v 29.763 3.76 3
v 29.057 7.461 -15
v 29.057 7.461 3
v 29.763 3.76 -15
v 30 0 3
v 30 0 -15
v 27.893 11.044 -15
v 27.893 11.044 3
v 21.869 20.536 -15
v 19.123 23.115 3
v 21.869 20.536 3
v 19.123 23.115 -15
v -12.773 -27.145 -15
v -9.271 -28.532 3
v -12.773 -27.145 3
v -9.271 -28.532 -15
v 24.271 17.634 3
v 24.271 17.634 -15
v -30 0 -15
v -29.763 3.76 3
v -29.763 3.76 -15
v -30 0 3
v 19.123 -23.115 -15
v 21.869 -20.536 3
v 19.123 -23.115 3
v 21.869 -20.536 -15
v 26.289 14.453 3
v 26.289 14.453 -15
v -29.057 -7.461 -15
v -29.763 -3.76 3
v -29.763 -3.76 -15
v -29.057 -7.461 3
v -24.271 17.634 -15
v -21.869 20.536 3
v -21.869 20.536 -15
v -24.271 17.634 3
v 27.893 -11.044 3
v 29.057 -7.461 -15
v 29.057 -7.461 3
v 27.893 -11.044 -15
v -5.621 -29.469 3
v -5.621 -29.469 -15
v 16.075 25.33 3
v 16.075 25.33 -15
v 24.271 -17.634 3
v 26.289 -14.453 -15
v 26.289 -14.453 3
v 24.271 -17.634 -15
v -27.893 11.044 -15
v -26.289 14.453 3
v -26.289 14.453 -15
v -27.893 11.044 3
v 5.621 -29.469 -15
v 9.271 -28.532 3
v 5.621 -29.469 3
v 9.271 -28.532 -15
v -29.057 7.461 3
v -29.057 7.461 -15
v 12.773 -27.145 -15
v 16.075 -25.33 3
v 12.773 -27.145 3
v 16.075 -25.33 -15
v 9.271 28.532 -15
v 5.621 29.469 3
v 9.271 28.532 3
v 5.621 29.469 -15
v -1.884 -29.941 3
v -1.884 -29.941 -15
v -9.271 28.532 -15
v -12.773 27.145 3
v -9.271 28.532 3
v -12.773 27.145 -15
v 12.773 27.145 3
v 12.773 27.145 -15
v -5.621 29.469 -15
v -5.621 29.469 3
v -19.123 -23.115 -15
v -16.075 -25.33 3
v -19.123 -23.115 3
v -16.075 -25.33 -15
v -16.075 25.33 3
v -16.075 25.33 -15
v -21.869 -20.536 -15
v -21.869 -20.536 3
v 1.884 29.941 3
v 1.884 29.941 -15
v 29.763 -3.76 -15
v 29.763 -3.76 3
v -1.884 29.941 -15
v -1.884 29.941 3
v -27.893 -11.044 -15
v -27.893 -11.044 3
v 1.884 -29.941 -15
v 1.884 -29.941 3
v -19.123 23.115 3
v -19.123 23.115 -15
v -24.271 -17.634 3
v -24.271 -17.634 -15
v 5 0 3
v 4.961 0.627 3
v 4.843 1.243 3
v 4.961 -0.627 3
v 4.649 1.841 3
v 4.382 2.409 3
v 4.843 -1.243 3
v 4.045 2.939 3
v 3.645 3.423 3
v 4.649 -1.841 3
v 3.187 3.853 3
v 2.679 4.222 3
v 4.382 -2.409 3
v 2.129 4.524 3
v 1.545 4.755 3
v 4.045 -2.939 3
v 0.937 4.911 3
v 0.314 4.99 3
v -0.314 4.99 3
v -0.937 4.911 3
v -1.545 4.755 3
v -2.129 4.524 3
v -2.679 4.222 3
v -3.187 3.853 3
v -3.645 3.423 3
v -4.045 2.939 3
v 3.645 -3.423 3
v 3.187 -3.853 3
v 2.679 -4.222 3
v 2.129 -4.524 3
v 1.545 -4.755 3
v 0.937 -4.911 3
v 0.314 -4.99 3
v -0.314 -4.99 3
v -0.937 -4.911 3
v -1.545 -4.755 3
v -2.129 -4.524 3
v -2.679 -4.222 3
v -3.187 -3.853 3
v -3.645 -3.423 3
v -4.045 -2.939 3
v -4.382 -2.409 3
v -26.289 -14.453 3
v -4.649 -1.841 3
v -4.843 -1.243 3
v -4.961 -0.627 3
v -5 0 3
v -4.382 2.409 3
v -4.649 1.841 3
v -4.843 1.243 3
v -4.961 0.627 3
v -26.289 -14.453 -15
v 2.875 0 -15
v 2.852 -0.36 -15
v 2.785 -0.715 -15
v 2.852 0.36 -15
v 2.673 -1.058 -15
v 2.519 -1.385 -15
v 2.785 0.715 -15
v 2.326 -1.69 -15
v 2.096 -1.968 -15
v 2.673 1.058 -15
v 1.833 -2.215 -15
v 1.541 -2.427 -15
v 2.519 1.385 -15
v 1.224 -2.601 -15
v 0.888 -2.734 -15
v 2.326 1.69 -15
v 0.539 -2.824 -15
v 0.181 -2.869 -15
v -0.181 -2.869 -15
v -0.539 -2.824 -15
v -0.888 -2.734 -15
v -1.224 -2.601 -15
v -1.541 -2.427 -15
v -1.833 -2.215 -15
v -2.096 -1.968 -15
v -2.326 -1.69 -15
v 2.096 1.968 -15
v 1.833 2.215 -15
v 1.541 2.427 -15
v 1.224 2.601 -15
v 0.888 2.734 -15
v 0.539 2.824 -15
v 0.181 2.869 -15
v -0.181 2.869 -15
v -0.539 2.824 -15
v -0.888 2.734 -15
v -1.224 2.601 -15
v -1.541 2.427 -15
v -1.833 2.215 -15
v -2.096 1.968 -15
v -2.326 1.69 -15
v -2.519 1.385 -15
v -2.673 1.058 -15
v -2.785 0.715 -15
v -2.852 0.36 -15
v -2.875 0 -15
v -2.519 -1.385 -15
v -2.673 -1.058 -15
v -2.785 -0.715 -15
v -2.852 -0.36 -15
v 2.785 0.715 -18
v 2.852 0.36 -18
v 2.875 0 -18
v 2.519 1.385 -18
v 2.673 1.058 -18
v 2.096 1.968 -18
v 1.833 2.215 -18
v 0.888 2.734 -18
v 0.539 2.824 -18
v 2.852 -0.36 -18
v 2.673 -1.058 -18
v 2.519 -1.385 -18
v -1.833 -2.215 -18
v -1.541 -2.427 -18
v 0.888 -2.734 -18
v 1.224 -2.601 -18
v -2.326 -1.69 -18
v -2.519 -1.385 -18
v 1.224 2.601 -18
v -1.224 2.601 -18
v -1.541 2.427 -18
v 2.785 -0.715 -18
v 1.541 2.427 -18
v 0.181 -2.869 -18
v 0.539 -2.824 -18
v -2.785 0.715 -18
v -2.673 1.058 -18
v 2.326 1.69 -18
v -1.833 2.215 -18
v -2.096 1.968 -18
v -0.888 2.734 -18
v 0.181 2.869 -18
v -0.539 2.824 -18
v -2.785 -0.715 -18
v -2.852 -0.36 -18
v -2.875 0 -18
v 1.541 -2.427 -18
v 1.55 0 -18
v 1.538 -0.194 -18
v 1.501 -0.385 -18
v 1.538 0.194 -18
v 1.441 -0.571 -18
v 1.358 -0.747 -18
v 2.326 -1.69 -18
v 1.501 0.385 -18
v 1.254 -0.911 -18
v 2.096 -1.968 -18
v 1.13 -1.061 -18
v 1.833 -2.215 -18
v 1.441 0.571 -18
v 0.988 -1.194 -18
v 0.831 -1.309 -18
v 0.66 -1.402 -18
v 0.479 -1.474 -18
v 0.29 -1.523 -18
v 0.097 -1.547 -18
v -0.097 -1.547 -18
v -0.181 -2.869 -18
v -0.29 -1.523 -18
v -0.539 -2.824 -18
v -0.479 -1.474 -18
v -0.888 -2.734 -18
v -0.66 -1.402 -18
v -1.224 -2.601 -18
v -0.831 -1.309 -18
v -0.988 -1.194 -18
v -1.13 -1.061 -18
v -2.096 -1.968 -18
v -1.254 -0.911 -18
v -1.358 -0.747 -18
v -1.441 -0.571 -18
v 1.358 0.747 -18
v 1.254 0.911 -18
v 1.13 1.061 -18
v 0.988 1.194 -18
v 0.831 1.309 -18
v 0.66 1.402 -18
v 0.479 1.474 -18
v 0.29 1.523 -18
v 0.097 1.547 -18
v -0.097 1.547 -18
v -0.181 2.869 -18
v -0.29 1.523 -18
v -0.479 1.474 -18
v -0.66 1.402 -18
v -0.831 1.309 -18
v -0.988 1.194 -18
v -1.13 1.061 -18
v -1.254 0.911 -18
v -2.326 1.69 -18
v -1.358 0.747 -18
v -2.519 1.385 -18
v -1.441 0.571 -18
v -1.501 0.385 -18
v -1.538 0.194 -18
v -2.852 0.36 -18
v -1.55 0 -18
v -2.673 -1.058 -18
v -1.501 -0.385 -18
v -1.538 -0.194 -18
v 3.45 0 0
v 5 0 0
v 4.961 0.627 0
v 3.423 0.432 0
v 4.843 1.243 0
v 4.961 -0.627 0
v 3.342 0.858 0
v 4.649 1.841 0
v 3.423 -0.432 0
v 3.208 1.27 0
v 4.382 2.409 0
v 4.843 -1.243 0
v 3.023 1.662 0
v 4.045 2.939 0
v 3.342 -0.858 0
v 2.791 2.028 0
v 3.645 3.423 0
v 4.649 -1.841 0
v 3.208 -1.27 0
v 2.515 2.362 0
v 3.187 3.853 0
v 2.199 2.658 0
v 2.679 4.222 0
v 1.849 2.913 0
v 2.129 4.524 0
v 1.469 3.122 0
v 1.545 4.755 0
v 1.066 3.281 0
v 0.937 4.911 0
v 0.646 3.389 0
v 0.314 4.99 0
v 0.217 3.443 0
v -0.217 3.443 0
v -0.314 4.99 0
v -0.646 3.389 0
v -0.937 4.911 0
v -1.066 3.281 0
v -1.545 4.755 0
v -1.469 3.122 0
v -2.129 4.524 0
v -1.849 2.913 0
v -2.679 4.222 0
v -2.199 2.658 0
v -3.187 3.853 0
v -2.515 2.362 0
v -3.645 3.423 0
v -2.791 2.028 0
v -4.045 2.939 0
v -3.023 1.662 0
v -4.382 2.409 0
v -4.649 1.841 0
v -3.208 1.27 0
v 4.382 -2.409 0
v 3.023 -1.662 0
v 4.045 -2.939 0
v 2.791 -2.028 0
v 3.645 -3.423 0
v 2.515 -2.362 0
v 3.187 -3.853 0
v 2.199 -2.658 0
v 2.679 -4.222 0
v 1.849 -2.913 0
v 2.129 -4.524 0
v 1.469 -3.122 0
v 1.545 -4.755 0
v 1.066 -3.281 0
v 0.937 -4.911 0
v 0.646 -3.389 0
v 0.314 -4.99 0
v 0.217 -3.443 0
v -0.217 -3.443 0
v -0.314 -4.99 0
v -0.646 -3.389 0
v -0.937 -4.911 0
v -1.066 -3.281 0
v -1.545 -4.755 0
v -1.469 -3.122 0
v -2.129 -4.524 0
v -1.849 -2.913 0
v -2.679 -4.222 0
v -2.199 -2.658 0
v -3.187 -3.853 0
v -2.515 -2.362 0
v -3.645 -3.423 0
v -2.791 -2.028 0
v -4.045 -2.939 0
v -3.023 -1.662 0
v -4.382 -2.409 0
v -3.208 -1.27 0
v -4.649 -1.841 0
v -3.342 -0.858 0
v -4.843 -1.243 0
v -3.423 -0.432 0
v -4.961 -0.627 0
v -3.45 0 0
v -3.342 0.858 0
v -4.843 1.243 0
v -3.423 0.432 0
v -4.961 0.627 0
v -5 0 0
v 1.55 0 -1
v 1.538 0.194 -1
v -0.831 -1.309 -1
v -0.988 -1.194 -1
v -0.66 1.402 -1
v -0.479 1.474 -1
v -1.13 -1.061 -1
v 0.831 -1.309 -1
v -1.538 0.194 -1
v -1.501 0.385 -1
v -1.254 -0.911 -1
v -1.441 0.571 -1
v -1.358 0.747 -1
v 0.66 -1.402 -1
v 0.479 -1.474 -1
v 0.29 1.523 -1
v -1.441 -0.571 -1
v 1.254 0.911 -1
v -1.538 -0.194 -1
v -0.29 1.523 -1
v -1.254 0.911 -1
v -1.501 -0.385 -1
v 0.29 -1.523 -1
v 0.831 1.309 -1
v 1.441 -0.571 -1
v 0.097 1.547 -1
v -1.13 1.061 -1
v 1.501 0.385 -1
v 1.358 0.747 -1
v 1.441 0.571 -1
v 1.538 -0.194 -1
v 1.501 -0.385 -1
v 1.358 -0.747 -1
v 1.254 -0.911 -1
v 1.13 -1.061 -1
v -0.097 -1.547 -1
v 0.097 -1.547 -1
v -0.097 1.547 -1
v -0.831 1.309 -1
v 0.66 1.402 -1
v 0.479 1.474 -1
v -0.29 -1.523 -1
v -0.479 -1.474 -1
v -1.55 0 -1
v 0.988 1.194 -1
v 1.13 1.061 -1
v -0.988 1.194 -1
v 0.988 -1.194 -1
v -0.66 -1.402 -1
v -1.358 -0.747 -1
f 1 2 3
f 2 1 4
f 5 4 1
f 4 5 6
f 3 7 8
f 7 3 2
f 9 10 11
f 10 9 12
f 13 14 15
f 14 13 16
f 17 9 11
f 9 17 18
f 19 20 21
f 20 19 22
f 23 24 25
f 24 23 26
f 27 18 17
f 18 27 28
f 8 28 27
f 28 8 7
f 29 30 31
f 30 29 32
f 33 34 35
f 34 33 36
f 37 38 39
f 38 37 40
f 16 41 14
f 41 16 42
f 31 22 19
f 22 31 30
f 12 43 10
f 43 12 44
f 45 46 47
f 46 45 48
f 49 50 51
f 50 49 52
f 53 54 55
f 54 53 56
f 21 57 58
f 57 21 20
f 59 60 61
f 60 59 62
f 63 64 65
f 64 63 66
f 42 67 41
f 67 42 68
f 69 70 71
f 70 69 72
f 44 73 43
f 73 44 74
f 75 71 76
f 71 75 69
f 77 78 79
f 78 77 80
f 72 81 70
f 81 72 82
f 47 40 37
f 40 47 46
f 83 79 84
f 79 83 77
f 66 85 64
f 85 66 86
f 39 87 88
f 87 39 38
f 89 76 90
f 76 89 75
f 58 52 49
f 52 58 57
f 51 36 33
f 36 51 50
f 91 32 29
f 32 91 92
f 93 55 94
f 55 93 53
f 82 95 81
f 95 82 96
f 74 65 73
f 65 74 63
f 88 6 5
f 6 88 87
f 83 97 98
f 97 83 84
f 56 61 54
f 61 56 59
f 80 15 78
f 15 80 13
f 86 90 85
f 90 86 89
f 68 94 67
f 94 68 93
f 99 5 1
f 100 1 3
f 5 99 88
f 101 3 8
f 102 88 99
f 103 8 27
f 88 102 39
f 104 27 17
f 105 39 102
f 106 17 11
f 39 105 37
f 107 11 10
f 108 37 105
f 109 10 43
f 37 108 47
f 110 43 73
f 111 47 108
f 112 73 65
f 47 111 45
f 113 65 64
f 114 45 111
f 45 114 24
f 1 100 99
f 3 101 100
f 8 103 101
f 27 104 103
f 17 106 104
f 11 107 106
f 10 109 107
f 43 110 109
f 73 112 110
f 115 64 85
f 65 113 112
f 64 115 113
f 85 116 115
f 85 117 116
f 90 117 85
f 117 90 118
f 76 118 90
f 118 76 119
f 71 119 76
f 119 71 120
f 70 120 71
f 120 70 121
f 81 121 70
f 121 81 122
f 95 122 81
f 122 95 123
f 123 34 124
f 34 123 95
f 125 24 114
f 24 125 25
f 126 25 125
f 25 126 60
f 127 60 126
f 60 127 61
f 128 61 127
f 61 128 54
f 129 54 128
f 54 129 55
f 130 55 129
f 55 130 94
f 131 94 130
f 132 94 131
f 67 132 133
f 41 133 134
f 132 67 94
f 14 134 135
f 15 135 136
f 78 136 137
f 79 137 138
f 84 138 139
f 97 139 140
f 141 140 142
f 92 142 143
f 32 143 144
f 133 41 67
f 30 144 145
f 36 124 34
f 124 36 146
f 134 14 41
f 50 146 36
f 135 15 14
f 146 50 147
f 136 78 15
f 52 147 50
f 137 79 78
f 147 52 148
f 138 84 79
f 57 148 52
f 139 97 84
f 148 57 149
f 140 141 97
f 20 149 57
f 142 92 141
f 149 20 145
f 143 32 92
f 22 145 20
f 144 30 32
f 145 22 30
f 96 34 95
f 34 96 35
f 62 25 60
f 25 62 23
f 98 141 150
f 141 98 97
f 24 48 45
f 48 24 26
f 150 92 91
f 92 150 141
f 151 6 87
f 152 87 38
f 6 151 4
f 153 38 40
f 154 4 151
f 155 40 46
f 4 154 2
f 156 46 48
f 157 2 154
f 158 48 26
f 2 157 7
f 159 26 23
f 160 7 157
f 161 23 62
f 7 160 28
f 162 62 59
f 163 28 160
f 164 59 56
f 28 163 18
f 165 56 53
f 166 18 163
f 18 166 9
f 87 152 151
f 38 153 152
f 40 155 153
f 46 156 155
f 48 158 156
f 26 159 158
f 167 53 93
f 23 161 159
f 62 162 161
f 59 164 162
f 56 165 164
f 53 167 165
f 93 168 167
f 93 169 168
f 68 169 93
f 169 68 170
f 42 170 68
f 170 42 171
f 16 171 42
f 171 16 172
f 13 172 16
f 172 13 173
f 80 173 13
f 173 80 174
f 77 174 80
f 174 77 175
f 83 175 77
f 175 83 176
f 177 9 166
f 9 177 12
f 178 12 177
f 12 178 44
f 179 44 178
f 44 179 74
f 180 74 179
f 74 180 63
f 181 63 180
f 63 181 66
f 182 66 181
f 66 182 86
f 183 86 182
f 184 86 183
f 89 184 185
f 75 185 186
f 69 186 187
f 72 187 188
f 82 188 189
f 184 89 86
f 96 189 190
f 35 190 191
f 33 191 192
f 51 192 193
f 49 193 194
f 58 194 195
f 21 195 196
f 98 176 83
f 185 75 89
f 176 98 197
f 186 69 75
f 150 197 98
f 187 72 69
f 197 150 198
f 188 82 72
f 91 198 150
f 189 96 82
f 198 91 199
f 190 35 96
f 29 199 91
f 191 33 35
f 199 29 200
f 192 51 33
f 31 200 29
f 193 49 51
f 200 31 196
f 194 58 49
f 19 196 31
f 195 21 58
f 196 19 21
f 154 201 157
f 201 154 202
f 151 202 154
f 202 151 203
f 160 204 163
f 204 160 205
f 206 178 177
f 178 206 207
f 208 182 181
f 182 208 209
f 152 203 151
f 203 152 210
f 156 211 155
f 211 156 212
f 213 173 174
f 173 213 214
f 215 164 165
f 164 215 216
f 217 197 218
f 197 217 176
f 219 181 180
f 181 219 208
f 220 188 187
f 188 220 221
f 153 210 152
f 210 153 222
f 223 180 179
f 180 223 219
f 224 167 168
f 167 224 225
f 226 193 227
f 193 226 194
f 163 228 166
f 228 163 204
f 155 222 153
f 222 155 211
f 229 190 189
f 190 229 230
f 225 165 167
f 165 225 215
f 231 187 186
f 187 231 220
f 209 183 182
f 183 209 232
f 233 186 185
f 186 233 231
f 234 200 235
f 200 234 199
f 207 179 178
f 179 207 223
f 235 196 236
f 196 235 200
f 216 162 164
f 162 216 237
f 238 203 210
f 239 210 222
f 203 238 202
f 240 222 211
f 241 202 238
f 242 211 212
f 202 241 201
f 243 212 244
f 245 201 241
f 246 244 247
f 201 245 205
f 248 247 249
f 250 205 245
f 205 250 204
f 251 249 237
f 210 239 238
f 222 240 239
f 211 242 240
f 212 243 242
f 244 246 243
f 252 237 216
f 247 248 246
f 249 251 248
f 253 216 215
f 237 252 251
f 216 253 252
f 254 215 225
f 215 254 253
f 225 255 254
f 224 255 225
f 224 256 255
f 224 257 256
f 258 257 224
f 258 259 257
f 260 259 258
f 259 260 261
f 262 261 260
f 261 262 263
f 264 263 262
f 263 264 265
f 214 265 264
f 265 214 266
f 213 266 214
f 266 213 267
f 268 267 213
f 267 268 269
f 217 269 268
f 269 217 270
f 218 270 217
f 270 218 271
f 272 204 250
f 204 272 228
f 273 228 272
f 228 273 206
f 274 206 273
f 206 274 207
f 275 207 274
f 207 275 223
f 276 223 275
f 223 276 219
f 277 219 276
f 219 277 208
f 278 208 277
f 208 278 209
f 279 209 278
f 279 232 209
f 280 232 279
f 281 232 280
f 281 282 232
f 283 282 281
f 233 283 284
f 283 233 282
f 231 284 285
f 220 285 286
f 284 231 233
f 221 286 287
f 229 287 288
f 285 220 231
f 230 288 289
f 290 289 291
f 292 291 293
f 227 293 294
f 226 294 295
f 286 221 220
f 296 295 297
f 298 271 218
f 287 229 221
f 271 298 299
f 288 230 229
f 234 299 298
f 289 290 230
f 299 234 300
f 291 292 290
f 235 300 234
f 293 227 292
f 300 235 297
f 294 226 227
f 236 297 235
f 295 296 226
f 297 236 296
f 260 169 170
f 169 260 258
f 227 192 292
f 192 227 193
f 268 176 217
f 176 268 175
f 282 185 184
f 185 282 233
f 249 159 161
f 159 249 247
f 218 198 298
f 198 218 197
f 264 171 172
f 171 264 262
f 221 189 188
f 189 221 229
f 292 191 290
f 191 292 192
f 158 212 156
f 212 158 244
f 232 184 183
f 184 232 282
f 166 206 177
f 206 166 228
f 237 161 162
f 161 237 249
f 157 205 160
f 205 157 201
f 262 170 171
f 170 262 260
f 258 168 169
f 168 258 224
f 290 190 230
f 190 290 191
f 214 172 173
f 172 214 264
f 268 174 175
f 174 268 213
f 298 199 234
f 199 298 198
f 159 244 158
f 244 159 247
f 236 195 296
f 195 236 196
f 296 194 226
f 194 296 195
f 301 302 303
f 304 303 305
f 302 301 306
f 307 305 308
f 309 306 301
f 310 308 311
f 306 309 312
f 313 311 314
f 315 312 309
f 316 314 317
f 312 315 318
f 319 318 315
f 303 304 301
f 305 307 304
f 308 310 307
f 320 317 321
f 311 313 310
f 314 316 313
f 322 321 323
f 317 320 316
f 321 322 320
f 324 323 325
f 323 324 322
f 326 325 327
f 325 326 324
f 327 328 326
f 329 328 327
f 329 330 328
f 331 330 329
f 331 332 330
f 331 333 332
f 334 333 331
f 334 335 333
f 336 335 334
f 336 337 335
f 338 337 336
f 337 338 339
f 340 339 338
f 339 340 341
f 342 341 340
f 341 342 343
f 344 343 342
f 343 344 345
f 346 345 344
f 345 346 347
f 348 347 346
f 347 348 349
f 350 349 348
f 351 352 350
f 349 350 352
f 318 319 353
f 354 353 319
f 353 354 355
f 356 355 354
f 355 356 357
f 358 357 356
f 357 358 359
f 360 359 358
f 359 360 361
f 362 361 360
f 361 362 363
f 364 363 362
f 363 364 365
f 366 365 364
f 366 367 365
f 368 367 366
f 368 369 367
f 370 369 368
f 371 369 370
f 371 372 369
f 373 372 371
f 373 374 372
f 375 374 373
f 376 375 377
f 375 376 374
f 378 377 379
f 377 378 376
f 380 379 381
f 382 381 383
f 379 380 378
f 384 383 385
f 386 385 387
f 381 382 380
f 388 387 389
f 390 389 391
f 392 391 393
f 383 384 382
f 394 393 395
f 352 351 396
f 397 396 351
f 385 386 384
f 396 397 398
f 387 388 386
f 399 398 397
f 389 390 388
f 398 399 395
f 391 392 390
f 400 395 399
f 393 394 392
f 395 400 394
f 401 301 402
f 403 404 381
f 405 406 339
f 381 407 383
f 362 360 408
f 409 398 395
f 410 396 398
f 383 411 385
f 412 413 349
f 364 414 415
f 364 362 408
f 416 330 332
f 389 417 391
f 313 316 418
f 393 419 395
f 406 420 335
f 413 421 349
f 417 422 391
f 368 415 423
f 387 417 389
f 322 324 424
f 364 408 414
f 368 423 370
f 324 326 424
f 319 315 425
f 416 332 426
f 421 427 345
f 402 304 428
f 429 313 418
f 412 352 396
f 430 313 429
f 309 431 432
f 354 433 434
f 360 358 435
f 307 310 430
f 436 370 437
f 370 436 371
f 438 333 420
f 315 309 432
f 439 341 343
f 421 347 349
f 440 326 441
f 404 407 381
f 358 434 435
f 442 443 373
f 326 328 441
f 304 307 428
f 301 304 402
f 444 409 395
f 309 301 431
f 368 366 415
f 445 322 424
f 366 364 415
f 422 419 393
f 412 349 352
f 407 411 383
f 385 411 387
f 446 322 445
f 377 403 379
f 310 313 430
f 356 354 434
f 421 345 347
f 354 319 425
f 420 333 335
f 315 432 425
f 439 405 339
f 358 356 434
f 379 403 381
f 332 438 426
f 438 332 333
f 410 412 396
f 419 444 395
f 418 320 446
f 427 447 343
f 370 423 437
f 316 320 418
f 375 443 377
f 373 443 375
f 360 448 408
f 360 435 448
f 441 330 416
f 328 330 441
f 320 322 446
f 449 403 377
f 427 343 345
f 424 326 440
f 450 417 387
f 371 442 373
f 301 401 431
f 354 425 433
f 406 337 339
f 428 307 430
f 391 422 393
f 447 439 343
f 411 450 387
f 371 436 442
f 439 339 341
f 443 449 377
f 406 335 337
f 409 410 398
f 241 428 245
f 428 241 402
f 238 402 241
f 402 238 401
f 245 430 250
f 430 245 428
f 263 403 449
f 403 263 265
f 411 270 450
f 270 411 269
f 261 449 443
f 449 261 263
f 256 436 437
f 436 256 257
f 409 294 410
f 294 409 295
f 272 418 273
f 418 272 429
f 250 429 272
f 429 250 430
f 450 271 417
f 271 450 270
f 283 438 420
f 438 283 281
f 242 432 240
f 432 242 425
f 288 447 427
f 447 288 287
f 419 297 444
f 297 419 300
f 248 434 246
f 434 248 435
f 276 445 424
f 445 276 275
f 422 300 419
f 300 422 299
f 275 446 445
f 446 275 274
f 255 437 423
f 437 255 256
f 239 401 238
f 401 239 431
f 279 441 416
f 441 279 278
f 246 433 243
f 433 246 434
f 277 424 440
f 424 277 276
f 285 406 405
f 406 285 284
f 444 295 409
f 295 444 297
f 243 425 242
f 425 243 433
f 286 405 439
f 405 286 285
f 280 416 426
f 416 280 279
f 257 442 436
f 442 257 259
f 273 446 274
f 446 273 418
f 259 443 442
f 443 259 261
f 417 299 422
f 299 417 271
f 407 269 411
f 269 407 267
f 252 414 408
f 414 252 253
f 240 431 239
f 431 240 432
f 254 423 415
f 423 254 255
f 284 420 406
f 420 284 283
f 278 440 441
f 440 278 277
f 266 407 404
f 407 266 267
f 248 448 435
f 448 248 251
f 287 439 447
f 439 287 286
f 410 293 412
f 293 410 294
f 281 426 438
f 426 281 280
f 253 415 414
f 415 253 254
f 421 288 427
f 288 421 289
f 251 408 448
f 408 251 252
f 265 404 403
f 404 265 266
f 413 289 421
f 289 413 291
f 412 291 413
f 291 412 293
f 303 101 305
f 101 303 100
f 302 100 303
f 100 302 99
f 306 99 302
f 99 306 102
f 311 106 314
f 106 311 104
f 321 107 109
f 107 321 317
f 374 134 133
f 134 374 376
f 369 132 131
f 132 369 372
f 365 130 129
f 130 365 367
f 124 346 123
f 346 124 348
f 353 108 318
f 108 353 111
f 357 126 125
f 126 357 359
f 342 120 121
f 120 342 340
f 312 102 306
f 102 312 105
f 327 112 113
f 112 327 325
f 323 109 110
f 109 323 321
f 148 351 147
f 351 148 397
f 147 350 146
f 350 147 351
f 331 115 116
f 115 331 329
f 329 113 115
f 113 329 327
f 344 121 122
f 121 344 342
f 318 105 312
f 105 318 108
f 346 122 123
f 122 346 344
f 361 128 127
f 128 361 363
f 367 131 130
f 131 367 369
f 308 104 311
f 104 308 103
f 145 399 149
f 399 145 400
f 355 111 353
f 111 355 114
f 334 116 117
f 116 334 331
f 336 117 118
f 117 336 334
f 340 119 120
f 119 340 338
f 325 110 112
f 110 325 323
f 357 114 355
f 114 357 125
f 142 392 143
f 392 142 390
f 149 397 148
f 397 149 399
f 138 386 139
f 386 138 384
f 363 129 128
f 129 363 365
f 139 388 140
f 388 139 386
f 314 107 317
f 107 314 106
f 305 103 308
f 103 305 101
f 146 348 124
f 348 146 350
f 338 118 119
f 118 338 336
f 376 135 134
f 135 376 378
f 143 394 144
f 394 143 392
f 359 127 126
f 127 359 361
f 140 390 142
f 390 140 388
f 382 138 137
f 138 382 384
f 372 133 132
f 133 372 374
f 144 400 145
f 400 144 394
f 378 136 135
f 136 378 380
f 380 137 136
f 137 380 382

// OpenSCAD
$fn = 50;

difference() {
	union() {
		translate(v = [0, 0, -15.0]) {
			cylinder(h = 18, r = 30.0);
		}
		#translate(v = [0, 0, -18.0]) {
			cylinder(h = 18, r = 2.875);
		}
	}
	union() {
		translate(v = [0, 0, 0]) {
			rotate(a = [0, 0, 0]) {
				difference() {
					union() {
						translate(v = [0, 0, -18.0]) {
							cylinder(h = 18, r = 1.25);
						}
						translate(v = [0, 0, -1.0]) {
							cylinder(h = 1.0, r1 = 1.55, r2 = 3.45);
						}
						translate(v = [0, 0, -18.0]) {
							cylinder(h = 18, r = 1.55);
						}
						translate(v = [0, 0, -18.0]) {
							cylinder(h = 18, r = 1.25);
						}
					}
					union();
				}
			}
		}
		#cylinder(h = 3, r = 5.0);
	}
}
